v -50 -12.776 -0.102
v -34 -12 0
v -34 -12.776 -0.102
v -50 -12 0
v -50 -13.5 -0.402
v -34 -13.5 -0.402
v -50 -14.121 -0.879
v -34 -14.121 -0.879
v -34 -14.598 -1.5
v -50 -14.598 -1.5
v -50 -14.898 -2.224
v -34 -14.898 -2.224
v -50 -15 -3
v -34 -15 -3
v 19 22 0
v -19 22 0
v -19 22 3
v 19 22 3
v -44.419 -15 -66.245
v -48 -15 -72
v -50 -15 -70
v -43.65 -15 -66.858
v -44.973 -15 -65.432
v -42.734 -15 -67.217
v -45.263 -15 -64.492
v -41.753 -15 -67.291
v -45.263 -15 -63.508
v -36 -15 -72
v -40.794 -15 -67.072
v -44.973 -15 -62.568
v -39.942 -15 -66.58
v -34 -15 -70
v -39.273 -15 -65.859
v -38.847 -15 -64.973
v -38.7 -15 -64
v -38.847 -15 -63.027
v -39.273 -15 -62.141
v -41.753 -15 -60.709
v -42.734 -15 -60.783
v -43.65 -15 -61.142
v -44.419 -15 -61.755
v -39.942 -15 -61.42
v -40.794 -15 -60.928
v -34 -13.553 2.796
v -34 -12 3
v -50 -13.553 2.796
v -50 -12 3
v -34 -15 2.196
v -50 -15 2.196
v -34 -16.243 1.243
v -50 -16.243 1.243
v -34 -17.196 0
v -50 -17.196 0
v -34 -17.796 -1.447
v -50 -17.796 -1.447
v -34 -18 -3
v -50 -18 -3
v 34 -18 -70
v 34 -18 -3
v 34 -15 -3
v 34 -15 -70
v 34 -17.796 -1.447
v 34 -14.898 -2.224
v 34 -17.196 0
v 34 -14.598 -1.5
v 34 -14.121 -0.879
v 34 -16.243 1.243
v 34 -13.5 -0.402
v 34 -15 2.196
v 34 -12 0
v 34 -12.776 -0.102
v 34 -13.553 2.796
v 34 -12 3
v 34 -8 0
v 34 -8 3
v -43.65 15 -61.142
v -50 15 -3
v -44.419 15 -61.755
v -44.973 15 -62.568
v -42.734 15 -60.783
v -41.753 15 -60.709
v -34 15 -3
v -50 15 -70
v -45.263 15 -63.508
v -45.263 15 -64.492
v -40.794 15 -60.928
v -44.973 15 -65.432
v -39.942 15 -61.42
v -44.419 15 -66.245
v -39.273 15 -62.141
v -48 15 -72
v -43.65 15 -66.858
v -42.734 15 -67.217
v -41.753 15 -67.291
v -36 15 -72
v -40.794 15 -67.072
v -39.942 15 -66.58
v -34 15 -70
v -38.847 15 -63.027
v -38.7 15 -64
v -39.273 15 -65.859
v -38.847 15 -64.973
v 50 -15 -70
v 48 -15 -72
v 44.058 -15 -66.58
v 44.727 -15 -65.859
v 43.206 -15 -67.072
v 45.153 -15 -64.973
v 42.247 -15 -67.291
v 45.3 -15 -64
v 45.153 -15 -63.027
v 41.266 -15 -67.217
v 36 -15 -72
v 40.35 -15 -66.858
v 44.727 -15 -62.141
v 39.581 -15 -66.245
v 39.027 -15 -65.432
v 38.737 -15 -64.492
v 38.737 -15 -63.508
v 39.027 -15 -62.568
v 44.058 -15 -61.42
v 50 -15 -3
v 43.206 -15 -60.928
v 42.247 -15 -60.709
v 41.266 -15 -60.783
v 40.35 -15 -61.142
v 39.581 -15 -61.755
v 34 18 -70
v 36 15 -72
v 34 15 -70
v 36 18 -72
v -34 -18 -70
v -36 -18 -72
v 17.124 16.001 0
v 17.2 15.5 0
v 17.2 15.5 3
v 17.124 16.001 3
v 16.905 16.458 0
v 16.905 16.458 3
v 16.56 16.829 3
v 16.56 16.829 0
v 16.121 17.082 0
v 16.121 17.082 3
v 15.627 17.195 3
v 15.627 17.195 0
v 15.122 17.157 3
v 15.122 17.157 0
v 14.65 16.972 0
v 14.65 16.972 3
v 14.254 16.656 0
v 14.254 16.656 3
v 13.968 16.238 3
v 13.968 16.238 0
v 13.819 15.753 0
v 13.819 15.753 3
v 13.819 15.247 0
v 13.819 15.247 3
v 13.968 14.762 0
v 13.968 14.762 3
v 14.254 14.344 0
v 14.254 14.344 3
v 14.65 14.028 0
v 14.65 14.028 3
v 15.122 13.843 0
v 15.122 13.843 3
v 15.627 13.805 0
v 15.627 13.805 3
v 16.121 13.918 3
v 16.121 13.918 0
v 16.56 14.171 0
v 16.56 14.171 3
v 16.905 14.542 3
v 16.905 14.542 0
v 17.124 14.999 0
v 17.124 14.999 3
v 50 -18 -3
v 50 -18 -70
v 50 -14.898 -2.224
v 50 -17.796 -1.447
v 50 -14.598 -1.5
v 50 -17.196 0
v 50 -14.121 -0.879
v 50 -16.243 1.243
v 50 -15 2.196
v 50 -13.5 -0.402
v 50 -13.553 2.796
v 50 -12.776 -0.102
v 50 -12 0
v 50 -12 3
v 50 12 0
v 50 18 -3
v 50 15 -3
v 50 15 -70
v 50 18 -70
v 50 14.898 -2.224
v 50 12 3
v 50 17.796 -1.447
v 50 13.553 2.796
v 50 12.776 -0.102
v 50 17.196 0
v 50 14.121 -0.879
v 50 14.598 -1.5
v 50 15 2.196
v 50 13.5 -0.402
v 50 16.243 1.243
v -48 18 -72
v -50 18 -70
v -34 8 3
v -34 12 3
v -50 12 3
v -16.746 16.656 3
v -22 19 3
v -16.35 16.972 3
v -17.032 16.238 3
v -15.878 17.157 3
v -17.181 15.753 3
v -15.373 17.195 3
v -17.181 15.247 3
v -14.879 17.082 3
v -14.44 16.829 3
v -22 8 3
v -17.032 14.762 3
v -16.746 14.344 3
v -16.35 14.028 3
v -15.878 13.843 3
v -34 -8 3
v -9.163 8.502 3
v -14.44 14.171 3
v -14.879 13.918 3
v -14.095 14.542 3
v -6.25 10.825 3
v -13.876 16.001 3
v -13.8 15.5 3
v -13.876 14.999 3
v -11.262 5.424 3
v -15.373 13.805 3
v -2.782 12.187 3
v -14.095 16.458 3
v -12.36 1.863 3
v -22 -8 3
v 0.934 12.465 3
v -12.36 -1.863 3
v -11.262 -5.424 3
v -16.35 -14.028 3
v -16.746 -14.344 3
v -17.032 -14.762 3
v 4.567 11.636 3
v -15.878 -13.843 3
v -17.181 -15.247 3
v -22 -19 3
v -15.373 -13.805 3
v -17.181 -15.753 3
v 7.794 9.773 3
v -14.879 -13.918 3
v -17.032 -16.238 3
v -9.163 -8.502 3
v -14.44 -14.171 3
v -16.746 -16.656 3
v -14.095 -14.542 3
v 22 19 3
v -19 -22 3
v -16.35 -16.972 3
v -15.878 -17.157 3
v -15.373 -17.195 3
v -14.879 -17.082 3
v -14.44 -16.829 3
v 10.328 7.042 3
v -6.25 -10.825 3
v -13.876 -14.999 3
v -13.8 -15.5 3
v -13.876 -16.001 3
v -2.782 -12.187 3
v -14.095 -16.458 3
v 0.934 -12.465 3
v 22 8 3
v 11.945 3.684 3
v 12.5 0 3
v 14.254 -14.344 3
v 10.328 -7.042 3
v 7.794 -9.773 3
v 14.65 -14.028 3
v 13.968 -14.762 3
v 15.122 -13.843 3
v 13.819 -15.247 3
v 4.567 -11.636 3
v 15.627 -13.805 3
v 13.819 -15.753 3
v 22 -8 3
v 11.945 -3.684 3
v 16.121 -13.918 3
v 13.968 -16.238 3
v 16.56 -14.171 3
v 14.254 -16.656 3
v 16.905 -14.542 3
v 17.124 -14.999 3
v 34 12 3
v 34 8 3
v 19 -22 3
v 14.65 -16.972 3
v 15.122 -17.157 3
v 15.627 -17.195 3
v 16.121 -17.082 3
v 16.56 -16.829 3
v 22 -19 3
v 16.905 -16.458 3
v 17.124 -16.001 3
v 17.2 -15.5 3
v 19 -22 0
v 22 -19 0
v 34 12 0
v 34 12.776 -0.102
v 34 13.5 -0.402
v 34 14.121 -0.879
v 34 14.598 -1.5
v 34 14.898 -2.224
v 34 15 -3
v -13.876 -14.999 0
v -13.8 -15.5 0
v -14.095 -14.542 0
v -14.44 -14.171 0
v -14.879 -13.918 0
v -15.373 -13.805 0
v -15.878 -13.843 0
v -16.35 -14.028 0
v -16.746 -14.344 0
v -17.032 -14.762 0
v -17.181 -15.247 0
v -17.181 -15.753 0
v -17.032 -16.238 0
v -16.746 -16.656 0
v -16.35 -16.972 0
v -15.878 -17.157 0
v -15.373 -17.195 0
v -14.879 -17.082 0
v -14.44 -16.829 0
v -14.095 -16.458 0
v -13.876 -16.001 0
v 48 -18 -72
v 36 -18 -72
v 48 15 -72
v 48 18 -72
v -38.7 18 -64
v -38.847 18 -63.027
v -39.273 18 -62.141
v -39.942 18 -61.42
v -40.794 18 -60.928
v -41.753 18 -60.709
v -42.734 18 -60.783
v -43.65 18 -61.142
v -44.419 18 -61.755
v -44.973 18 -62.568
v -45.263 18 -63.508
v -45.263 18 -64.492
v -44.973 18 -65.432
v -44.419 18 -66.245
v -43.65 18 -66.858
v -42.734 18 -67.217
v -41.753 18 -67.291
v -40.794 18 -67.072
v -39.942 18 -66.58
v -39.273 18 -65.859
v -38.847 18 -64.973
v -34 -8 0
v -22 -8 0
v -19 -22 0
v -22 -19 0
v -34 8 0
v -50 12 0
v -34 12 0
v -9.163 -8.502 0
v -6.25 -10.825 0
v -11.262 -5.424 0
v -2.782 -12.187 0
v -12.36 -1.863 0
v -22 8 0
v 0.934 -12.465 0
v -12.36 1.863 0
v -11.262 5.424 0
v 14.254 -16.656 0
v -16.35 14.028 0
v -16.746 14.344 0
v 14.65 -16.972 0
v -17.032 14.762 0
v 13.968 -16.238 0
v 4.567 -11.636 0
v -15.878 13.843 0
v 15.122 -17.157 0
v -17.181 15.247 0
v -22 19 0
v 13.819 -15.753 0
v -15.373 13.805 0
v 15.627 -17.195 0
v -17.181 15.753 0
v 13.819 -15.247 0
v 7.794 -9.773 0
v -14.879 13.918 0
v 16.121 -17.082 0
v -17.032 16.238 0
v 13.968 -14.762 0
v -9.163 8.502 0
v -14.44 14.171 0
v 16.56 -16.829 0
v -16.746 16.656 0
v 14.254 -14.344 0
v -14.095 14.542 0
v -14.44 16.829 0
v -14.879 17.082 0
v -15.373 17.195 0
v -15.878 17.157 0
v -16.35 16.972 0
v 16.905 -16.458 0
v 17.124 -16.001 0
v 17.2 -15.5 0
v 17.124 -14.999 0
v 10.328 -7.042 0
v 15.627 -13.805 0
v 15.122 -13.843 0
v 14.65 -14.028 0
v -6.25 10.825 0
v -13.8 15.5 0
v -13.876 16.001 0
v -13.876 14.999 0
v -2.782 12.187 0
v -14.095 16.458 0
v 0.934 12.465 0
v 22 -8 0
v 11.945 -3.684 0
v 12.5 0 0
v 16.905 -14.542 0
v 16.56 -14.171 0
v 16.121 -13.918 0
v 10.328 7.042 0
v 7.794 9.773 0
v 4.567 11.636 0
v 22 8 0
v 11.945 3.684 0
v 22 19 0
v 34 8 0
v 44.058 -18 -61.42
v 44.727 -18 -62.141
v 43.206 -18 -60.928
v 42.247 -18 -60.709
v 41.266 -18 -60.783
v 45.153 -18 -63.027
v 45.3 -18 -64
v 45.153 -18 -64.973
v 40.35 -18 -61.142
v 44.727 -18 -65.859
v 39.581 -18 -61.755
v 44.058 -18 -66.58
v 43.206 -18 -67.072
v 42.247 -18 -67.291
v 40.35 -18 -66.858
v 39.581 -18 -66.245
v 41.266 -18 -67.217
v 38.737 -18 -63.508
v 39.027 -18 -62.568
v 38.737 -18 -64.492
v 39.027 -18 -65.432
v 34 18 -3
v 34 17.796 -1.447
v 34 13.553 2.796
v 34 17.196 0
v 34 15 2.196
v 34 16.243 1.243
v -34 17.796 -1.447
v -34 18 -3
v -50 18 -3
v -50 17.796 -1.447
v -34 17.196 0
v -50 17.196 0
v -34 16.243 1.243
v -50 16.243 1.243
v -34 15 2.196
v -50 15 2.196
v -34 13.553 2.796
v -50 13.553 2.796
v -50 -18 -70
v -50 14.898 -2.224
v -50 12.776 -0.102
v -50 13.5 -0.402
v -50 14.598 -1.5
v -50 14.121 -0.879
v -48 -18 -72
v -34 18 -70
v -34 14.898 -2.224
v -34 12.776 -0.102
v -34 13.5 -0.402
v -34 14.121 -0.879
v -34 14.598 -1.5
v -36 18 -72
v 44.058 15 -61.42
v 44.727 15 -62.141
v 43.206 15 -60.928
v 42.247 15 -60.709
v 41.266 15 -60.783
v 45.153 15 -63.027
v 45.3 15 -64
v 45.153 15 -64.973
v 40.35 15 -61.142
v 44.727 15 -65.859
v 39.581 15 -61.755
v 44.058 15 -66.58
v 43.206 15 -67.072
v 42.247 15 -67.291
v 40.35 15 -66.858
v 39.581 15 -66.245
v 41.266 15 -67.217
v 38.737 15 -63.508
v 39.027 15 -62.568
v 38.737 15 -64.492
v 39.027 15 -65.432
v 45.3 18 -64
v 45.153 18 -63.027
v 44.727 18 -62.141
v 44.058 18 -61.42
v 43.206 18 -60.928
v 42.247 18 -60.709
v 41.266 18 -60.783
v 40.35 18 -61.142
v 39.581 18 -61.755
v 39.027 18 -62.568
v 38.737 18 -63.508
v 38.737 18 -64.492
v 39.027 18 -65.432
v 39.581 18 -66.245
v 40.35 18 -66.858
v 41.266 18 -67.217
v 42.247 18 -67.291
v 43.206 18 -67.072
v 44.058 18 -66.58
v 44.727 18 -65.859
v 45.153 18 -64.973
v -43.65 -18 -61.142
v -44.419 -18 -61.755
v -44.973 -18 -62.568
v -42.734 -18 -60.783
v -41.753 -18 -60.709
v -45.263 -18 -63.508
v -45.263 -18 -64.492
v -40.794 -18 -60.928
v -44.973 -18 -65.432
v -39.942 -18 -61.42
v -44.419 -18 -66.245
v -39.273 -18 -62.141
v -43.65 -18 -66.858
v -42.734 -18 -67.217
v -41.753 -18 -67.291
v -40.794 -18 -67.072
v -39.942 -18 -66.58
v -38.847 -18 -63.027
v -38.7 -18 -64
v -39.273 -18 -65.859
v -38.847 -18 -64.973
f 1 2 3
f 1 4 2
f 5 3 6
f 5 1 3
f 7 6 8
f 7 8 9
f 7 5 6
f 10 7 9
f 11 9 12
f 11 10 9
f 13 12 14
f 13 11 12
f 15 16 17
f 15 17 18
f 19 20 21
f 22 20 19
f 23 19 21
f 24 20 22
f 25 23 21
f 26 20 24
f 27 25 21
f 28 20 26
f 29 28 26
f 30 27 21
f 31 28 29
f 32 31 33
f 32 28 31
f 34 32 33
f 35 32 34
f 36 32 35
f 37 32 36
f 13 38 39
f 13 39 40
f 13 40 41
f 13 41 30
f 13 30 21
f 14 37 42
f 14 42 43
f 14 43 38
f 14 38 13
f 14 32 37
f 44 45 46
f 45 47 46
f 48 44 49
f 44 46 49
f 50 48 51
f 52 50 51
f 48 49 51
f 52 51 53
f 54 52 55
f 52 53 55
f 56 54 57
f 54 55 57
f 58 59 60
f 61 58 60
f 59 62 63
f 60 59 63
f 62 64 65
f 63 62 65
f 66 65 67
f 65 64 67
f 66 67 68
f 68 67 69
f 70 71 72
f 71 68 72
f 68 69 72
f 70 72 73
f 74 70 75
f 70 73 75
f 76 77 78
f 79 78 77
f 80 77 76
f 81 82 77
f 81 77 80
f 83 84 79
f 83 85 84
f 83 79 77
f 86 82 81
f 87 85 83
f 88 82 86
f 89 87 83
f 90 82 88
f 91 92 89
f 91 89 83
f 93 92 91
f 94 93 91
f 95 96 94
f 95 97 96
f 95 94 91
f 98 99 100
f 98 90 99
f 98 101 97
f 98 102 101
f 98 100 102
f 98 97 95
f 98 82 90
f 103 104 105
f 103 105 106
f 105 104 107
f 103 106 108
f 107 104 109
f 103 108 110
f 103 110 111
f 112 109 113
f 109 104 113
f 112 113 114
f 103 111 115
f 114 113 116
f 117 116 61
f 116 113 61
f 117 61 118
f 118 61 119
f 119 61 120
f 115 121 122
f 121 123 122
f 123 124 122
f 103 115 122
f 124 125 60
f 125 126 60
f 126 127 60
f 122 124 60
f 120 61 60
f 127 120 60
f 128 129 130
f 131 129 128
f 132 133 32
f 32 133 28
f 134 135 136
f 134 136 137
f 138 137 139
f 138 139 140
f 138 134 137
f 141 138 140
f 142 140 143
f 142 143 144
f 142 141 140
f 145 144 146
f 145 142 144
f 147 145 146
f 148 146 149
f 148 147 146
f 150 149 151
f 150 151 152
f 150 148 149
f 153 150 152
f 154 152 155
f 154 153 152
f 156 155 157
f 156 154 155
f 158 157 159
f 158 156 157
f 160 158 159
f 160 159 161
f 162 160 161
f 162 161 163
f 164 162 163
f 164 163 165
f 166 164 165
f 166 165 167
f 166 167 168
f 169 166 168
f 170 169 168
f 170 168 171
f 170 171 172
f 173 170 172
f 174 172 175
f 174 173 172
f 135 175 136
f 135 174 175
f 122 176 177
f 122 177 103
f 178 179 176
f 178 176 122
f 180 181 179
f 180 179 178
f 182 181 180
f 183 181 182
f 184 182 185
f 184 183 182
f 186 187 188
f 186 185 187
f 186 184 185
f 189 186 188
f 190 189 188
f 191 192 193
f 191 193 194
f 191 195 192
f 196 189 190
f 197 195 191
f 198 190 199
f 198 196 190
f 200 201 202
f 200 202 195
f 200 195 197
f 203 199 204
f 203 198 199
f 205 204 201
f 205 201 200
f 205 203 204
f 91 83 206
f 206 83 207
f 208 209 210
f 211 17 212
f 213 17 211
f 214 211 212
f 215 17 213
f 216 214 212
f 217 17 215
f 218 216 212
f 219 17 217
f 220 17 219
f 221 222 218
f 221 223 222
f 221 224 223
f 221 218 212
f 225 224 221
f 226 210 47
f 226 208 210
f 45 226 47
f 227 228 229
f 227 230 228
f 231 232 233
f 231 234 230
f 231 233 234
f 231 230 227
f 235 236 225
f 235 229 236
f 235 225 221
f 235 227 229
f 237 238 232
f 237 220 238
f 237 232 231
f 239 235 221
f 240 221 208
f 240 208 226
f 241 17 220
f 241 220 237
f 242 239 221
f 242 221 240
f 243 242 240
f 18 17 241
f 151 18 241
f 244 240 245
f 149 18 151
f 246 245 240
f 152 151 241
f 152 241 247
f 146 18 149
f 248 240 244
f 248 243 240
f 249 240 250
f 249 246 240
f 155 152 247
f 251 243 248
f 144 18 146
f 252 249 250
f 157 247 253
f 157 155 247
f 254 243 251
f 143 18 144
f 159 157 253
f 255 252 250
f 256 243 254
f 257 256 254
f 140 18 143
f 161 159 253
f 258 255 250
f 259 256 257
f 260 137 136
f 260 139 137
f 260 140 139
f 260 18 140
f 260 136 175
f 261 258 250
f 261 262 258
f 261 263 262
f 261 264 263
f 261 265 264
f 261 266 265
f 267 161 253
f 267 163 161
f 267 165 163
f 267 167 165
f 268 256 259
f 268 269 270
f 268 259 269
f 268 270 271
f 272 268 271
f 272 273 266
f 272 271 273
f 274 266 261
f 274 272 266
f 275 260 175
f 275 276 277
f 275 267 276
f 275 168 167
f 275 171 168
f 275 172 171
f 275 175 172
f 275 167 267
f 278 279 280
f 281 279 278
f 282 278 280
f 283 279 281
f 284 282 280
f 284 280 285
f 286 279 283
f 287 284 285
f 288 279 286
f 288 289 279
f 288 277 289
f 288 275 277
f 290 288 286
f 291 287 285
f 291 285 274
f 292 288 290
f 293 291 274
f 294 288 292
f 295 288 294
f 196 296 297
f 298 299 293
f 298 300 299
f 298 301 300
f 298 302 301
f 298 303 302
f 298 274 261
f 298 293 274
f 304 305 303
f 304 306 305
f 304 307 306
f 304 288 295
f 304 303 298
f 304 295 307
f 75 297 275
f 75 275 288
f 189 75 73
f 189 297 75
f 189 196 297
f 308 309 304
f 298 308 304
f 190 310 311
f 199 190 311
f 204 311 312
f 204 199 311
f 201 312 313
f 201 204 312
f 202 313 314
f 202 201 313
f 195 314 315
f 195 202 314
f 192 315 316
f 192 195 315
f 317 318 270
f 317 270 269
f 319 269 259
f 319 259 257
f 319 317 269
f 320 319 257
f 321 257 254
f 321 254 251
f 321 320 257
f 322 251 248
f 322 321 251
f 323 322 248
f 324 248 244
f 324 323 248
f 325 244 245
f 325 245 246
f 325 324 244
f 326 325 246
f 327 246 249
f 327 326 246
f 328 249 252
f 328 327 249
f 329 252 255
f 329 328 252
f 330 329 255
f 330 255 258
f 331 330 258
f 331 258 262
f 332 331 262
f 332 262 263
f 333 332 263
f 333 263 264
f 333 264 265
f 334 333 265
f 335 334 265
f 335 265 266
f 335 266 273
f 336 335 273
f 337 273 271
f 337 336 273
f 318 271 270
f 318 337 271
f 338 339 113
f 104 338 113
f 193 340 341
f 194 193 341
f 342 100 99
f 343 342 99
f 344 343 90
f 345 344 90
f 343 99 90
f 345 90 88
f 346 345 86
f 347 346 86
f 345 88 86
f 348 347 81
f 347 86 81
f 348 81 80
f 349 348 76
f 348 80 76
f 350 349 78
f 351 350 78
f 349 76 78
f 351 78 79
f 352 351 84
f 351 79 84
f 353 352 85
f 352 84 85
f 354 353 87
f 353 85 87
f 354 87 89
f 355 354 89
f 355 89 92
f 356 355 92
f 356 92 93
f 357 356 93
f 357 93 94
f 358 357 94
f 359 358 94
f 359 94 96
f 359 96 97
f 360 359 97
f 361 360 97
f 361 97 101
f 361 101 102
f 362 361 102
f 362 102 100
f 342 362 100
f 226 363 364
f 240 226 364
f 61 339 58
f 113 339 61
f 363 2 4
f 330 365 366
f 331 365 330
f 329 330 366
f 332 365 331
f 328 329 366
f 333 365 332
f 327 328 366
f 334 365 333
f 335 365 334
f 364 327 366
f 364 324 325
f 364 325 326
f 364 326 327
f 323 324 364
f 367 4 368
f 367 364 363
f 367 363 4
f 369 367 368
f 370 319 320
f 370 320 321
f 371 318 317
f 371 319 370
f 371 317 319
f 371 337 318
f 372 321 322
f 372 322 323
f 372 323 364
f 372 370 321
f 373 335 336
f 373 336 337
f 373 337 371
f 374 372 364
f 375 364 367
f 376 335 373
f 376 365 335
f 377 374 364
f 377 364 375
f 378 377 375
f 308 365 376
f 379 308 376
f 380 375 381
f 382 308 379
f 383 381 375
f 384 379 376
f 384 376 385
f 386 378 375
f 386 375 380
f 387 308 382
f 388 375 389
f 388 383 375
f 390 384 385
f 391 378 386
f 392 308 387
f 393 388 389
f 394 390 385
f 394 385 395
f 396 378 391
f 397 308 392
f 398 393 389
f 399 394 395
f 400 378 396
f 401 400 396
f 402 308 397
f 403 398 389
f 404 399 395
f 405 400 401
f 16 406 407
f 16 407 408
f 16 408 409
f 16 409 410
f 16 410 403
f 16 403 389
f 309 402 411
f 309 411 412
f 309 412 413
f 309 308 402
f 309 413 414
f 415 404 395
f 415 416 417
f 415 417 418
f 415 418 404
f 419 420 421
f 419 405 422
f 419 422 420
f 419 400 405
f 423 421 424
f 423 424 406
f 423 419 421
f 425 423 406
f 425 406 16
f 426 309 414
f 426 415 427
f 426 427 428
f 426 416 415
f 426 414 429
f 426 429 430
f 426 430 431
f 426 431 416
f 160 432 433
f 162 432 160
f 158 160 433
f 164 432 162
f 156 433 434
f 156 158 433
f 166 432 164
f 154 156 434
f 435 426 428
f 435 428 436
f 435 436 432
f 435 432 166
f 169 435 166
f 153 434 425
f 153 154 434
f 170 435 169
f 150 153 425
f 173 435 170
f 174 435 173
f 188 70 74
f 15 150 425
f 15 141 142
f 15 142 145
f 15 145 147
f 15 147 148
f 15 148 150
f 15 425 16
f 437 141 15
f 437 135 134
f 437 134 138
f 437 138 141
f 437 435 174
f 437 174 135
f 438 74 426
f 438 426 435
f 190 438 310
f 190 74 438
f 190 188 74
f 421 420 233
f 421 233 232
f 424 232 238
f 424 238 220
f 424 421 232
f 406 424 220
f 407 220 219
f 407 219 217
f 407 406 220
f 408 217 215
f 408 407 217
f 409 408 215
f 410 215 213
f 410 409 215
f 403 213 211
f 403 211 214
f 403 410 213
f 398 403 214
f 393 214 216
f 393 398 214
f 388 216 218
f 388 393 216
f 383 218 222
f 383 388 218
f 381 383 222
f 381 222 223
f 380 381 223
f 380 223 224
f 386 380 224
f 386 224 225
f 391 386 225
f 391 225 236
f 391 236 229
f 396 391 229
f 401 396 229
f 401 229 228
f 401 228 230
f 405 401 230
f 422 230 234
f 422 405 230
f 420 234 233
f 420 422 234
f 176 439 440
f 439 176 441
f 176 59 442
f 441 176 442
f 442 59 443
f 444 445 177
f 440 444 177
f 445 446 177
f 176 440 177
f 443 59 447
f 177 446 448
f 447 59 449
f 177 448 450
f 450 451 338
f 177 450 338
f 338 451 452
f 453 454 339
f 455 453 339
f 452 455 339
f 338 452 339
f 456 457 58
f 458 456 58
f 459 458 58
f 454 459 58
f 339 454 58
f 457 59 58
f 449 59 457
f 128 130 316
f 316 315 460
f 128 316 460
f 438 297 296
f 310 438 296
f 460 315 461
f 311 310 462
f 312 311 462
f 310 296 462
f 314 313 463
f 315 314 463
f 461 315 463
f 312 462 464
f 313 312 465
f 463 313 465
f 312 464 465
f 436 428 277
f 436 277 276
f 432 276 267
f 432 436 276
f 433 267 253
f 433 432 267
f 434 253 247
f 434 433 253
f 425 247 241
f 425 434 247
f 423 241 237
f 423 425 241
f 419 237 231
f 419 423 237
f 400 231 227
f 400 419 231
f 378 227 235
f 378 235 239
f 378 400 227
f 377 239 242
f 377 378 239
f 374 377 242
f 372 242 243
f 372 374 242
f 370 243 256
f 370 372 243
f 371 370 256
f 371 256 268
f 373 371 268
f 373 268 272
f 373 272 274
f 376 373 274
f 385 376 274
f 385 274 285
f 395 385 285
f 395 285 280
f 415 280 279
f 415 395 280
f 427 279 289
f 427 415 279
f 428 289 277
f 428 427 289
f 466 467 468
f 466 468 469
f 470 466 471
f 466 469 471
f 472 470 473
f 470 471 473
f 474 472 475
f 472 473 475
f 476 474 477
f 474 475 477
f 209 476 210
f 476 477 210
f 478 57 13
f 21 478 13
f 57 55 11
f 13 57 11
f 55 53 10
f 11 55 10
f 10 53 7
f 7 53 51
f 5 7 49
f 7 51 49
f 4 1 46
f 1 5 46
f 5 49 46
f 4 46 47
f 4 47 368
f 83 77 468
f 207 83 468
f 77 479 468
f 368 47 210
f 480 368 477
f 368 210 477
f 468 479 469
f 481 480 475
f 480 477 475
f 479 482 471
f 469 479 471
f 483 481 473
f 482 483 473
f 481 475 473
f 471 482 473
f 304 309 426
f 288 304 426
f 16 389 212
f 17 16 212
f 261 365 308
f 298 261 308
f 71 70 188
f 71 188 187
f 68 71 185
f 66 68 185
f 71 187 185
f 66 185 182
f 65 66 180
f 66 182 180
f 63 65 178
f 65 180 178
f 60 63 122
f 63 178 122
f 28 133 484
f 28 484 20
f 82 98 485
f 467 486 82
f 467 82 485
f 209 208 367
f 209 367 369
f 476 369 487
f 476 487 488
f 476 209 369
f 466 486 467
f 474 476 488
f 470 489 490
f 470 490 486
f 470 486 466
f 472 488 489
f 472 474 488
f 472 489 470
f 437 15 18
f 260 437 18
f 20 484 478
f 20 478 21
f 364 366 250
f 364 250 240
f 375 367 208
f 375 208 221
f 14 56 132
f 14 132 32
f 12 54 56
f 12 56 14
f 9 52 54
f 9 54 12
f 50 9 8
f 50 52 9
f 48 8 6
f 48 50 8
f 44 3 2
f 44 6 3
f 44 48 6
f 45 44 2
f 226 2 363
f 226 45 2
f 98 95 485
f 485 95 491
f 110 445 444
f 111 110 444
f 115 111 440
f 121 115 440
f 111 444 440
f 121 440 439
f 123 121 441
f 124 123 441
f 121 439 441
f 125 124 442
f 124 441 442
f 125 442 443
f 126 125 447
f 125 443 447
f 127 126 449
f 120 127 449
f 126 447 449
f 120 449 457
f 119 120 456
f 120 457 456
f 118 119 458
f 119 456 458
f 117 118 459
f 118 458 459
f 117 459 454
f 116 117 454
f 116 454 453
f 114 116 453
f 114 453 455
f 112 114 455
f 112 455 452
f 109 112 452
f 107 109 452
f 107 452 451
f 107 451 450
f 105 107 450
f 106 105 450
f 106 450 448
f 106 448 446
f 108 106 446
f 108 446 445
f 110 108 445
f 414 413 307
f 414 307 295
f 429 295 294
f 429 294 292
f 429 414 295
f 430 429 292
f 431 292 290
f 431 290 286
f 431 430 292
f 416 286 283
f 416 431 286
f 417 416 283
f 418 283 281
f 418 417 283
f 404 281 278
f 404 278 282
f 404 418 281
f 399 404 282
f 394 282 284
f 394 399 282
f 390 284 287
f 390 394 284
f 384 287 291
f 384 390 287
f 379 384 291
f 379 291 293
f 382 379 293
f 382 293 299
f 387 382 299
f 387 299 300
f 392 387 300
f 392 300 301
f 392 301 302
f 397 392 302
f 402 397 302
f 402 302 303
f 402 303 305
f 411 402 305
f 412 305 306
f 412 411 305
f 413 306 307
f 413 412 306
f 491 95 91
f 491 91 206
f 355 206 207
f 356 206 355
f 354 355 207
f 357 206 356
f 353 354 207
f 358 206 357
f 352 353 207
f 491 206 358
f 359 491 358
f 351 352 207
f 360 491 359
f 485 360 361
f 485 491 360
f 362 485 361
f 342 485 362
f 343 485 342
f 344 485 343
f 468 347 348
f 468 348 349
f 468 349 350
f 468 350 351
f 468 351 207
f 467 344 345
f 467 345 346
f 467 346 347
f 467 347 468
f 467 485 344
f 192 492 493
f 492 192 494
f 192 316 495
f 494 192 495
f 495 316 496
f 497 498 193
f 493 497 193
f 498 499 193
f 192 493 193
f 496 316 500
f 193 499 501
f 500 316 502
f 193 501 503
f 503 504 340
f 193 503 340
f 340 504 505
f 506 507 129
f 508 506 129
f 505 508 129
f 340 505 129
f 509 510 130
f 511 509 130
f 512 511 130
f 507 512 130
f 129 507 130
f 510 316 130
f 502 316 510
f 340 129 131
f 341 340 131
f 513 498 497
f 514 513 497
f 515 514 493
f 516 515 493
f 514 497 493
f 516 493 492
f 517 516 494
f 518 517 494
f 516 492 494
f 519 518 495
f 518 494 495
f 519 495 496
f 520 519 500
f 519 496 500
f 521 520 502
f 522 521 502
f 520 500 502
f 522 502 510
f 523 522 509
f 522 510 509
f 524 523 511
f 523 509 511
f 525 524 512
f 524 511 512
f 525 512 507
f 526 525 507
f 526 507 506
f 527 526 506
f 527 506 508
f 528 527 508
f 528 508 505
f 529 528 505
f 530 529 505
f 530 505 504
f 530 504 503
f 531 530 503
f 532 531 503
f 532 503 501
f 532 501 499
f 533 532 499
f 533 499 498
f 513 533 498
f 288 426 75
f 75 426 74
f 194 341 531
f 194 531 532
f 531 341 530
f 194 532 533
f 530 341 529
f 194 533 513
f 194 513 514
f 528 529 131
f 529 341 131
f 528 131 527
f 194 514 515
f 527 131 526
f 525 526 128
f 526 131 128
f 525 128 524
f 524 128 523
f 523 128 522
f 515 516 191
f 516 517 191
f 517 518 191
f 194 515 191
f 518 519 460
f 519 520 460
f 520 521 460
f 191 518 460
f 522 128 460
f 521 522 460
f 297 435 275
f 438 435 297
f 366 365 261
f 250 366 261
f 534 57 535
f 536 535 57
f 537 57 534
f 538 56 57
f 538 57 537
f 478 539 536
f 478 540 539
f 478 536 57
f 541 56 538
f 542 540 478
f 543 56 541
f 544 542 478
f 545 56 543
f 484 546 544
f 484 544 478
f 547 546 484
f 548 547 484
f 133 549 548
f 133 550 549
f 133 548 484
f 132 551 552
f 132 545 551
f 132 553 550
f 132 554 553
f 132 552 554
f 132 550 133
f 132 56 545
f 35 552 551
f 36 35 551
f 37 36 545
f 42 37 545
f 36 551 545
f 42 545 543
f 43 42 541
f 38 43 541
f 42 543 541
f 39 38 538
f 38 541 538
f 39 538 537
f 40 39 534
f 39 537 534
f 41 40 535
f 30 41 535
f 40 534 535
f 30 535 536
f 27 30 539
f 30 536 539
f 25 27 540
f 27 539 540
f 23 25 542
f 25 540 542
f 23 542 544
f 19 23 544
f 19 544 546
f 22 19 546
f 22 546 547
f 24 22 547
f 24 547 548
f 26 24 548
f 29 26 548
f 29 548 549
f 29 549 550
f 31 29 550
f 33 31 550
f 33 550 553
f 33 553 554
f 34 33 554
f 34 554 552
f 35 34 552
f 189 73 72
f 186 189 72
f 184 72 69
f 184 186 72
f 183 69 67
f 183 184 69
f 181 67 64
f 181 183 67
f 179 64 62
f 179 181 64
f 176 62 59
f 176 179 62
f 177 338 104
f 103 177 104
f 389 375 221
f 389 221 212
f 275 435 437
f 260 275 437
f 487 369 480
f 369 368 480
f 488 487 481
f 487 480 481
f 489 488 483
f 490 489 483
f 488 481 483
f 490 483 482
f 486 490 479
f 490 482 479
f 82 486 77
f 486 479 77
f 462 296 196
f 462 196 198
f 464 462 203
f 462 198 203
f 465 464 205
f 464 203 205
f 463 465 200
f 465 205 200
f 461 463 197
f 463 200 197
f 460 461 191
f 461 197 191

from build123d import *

# Parameters (mm, degrees)
SKETCH_W        = 44
SKETCH_H        = 44
SKETCH_R        = 12.5
SKETCH_R_2      = 1.7
SKETCH_W_2      = 12
SKETCH_H_2      = 16
PAD_DEPTH       = 3
CHAMFER_SIZE    = 3
PAD001_DEPTH    = 16
FILLET_R        = 6
FILLET001_R     = 3
CHAMFER001_SIZE = 2
SKETCH002_R     = 3.3
HOLE_DEPTH      = 40.001


with BuildPart() as part:
    # Sketch → Pad (new body)
    with BuildSketch(Plane.XY):
        Rectangle(SKETCH_W, SKETCH_H)
        Circle(SKETCH_R, mode=Mode.SUBTRACT)
        with Locations((-15.5, 15.5)):
            Circle(SKETCH_R_2, mode=Mode.SUBTRACT)
        with Locations((15.5, 15.5)):
            Circle(SKETCH_R_2, mode=Mode.SUBTRACT)
        with Locations((15.5, -15.5)):
            Circle(SKETCH_R_2, mode=Mode.SUBTRACT)
        with Locations((-15.5, -15.5)):
            Circle(SKETCH_R_2, mode=Mode.SUBTRACT)
        with Locations((28, 0)):
            Rectangle(SKETCH_W_2, SKETCH_H_2)
        with Locations((-28, 0)):
            Rectangle(SKETCH_W_2, SKETCH_H_2)
    extrude(amount=PAD_DEPTH)

    # Chamfer
    chamfer_edges = [part.edges().sort_by_distance(p)[0] for p in [
        (-22, -22, 1.5),
        (22, -22, 1.5),
        (22, 22, 1.5),
        (-22, 22, 1.5),
    ]]
    chamfer(chamfer_edges, length=CHAMFER_SIZE)

    # Sketch001 (on Face11 of Chamfer) → Pad001 (join)
    with BuildSketch(Plane.YZ.offset(34)):
        Polygon((0, 0), (15, 0), (15, -72), (18, -72), (18, 3), (-18, 3), (-18, -72), (-15, -72), (-15, 0), align=None)
    pad001 = extrude(amount=PAD001_DEPTH)

    # Mirrored: Pad001 across YZ
    add(pad001.mirror(Plane.YZ))

    # Fillet
    fillet_edges = [part.edges().sort_by_distance(p)[0] for p in [
        (-42, -18, 3),
        (-42, 18, 3),
        (42, -18, 3),
        (42, 18, 3),
    ]]
    fillet(fillet_edges, radius=FILLET_R)

    # Fillet001
    fillet001_edges = [part.edges().sort_by_distance(p)[0] for p in [
        (-42, 15, 0),
        (42, 15, 0),
        (42, -15, 0),
        (-42, -15, 0),
    ]]
    fillet(fillet001_edges, radius=FILLET001_R)

    # Chamfer001
    chamfer001_edges = [part.edges().sort_by_distance(p)[0] for p in [
        (-50, -16.5, -72),
        (-34, -16.5, -72),
        (-50, 16.5, -72),
        (-34, 16.5, -72),
        (34, -16.5, -72),
        (50, -16.5, -72),
        (34, 16.5, -72),
        (50, 16.5, -72),
    ]]
    chamfer(chamfer001_edges, length=CHAMFER001_SIZE)

    # Sketch002 (on Face46 of Chamfer001) → Hole (cut, through all)
    with BuildSketch(Plane.XZ.offset(18)):
        with Locations((-42, -64)):
            Circle(SKETCH002_R)
        with Locations((42, -64)):
            Circle(SKETCH002_R)
    extrude(amount=-HOLE_DEPTH, mode=Mode.SUBTRACT)


solid = part.part
